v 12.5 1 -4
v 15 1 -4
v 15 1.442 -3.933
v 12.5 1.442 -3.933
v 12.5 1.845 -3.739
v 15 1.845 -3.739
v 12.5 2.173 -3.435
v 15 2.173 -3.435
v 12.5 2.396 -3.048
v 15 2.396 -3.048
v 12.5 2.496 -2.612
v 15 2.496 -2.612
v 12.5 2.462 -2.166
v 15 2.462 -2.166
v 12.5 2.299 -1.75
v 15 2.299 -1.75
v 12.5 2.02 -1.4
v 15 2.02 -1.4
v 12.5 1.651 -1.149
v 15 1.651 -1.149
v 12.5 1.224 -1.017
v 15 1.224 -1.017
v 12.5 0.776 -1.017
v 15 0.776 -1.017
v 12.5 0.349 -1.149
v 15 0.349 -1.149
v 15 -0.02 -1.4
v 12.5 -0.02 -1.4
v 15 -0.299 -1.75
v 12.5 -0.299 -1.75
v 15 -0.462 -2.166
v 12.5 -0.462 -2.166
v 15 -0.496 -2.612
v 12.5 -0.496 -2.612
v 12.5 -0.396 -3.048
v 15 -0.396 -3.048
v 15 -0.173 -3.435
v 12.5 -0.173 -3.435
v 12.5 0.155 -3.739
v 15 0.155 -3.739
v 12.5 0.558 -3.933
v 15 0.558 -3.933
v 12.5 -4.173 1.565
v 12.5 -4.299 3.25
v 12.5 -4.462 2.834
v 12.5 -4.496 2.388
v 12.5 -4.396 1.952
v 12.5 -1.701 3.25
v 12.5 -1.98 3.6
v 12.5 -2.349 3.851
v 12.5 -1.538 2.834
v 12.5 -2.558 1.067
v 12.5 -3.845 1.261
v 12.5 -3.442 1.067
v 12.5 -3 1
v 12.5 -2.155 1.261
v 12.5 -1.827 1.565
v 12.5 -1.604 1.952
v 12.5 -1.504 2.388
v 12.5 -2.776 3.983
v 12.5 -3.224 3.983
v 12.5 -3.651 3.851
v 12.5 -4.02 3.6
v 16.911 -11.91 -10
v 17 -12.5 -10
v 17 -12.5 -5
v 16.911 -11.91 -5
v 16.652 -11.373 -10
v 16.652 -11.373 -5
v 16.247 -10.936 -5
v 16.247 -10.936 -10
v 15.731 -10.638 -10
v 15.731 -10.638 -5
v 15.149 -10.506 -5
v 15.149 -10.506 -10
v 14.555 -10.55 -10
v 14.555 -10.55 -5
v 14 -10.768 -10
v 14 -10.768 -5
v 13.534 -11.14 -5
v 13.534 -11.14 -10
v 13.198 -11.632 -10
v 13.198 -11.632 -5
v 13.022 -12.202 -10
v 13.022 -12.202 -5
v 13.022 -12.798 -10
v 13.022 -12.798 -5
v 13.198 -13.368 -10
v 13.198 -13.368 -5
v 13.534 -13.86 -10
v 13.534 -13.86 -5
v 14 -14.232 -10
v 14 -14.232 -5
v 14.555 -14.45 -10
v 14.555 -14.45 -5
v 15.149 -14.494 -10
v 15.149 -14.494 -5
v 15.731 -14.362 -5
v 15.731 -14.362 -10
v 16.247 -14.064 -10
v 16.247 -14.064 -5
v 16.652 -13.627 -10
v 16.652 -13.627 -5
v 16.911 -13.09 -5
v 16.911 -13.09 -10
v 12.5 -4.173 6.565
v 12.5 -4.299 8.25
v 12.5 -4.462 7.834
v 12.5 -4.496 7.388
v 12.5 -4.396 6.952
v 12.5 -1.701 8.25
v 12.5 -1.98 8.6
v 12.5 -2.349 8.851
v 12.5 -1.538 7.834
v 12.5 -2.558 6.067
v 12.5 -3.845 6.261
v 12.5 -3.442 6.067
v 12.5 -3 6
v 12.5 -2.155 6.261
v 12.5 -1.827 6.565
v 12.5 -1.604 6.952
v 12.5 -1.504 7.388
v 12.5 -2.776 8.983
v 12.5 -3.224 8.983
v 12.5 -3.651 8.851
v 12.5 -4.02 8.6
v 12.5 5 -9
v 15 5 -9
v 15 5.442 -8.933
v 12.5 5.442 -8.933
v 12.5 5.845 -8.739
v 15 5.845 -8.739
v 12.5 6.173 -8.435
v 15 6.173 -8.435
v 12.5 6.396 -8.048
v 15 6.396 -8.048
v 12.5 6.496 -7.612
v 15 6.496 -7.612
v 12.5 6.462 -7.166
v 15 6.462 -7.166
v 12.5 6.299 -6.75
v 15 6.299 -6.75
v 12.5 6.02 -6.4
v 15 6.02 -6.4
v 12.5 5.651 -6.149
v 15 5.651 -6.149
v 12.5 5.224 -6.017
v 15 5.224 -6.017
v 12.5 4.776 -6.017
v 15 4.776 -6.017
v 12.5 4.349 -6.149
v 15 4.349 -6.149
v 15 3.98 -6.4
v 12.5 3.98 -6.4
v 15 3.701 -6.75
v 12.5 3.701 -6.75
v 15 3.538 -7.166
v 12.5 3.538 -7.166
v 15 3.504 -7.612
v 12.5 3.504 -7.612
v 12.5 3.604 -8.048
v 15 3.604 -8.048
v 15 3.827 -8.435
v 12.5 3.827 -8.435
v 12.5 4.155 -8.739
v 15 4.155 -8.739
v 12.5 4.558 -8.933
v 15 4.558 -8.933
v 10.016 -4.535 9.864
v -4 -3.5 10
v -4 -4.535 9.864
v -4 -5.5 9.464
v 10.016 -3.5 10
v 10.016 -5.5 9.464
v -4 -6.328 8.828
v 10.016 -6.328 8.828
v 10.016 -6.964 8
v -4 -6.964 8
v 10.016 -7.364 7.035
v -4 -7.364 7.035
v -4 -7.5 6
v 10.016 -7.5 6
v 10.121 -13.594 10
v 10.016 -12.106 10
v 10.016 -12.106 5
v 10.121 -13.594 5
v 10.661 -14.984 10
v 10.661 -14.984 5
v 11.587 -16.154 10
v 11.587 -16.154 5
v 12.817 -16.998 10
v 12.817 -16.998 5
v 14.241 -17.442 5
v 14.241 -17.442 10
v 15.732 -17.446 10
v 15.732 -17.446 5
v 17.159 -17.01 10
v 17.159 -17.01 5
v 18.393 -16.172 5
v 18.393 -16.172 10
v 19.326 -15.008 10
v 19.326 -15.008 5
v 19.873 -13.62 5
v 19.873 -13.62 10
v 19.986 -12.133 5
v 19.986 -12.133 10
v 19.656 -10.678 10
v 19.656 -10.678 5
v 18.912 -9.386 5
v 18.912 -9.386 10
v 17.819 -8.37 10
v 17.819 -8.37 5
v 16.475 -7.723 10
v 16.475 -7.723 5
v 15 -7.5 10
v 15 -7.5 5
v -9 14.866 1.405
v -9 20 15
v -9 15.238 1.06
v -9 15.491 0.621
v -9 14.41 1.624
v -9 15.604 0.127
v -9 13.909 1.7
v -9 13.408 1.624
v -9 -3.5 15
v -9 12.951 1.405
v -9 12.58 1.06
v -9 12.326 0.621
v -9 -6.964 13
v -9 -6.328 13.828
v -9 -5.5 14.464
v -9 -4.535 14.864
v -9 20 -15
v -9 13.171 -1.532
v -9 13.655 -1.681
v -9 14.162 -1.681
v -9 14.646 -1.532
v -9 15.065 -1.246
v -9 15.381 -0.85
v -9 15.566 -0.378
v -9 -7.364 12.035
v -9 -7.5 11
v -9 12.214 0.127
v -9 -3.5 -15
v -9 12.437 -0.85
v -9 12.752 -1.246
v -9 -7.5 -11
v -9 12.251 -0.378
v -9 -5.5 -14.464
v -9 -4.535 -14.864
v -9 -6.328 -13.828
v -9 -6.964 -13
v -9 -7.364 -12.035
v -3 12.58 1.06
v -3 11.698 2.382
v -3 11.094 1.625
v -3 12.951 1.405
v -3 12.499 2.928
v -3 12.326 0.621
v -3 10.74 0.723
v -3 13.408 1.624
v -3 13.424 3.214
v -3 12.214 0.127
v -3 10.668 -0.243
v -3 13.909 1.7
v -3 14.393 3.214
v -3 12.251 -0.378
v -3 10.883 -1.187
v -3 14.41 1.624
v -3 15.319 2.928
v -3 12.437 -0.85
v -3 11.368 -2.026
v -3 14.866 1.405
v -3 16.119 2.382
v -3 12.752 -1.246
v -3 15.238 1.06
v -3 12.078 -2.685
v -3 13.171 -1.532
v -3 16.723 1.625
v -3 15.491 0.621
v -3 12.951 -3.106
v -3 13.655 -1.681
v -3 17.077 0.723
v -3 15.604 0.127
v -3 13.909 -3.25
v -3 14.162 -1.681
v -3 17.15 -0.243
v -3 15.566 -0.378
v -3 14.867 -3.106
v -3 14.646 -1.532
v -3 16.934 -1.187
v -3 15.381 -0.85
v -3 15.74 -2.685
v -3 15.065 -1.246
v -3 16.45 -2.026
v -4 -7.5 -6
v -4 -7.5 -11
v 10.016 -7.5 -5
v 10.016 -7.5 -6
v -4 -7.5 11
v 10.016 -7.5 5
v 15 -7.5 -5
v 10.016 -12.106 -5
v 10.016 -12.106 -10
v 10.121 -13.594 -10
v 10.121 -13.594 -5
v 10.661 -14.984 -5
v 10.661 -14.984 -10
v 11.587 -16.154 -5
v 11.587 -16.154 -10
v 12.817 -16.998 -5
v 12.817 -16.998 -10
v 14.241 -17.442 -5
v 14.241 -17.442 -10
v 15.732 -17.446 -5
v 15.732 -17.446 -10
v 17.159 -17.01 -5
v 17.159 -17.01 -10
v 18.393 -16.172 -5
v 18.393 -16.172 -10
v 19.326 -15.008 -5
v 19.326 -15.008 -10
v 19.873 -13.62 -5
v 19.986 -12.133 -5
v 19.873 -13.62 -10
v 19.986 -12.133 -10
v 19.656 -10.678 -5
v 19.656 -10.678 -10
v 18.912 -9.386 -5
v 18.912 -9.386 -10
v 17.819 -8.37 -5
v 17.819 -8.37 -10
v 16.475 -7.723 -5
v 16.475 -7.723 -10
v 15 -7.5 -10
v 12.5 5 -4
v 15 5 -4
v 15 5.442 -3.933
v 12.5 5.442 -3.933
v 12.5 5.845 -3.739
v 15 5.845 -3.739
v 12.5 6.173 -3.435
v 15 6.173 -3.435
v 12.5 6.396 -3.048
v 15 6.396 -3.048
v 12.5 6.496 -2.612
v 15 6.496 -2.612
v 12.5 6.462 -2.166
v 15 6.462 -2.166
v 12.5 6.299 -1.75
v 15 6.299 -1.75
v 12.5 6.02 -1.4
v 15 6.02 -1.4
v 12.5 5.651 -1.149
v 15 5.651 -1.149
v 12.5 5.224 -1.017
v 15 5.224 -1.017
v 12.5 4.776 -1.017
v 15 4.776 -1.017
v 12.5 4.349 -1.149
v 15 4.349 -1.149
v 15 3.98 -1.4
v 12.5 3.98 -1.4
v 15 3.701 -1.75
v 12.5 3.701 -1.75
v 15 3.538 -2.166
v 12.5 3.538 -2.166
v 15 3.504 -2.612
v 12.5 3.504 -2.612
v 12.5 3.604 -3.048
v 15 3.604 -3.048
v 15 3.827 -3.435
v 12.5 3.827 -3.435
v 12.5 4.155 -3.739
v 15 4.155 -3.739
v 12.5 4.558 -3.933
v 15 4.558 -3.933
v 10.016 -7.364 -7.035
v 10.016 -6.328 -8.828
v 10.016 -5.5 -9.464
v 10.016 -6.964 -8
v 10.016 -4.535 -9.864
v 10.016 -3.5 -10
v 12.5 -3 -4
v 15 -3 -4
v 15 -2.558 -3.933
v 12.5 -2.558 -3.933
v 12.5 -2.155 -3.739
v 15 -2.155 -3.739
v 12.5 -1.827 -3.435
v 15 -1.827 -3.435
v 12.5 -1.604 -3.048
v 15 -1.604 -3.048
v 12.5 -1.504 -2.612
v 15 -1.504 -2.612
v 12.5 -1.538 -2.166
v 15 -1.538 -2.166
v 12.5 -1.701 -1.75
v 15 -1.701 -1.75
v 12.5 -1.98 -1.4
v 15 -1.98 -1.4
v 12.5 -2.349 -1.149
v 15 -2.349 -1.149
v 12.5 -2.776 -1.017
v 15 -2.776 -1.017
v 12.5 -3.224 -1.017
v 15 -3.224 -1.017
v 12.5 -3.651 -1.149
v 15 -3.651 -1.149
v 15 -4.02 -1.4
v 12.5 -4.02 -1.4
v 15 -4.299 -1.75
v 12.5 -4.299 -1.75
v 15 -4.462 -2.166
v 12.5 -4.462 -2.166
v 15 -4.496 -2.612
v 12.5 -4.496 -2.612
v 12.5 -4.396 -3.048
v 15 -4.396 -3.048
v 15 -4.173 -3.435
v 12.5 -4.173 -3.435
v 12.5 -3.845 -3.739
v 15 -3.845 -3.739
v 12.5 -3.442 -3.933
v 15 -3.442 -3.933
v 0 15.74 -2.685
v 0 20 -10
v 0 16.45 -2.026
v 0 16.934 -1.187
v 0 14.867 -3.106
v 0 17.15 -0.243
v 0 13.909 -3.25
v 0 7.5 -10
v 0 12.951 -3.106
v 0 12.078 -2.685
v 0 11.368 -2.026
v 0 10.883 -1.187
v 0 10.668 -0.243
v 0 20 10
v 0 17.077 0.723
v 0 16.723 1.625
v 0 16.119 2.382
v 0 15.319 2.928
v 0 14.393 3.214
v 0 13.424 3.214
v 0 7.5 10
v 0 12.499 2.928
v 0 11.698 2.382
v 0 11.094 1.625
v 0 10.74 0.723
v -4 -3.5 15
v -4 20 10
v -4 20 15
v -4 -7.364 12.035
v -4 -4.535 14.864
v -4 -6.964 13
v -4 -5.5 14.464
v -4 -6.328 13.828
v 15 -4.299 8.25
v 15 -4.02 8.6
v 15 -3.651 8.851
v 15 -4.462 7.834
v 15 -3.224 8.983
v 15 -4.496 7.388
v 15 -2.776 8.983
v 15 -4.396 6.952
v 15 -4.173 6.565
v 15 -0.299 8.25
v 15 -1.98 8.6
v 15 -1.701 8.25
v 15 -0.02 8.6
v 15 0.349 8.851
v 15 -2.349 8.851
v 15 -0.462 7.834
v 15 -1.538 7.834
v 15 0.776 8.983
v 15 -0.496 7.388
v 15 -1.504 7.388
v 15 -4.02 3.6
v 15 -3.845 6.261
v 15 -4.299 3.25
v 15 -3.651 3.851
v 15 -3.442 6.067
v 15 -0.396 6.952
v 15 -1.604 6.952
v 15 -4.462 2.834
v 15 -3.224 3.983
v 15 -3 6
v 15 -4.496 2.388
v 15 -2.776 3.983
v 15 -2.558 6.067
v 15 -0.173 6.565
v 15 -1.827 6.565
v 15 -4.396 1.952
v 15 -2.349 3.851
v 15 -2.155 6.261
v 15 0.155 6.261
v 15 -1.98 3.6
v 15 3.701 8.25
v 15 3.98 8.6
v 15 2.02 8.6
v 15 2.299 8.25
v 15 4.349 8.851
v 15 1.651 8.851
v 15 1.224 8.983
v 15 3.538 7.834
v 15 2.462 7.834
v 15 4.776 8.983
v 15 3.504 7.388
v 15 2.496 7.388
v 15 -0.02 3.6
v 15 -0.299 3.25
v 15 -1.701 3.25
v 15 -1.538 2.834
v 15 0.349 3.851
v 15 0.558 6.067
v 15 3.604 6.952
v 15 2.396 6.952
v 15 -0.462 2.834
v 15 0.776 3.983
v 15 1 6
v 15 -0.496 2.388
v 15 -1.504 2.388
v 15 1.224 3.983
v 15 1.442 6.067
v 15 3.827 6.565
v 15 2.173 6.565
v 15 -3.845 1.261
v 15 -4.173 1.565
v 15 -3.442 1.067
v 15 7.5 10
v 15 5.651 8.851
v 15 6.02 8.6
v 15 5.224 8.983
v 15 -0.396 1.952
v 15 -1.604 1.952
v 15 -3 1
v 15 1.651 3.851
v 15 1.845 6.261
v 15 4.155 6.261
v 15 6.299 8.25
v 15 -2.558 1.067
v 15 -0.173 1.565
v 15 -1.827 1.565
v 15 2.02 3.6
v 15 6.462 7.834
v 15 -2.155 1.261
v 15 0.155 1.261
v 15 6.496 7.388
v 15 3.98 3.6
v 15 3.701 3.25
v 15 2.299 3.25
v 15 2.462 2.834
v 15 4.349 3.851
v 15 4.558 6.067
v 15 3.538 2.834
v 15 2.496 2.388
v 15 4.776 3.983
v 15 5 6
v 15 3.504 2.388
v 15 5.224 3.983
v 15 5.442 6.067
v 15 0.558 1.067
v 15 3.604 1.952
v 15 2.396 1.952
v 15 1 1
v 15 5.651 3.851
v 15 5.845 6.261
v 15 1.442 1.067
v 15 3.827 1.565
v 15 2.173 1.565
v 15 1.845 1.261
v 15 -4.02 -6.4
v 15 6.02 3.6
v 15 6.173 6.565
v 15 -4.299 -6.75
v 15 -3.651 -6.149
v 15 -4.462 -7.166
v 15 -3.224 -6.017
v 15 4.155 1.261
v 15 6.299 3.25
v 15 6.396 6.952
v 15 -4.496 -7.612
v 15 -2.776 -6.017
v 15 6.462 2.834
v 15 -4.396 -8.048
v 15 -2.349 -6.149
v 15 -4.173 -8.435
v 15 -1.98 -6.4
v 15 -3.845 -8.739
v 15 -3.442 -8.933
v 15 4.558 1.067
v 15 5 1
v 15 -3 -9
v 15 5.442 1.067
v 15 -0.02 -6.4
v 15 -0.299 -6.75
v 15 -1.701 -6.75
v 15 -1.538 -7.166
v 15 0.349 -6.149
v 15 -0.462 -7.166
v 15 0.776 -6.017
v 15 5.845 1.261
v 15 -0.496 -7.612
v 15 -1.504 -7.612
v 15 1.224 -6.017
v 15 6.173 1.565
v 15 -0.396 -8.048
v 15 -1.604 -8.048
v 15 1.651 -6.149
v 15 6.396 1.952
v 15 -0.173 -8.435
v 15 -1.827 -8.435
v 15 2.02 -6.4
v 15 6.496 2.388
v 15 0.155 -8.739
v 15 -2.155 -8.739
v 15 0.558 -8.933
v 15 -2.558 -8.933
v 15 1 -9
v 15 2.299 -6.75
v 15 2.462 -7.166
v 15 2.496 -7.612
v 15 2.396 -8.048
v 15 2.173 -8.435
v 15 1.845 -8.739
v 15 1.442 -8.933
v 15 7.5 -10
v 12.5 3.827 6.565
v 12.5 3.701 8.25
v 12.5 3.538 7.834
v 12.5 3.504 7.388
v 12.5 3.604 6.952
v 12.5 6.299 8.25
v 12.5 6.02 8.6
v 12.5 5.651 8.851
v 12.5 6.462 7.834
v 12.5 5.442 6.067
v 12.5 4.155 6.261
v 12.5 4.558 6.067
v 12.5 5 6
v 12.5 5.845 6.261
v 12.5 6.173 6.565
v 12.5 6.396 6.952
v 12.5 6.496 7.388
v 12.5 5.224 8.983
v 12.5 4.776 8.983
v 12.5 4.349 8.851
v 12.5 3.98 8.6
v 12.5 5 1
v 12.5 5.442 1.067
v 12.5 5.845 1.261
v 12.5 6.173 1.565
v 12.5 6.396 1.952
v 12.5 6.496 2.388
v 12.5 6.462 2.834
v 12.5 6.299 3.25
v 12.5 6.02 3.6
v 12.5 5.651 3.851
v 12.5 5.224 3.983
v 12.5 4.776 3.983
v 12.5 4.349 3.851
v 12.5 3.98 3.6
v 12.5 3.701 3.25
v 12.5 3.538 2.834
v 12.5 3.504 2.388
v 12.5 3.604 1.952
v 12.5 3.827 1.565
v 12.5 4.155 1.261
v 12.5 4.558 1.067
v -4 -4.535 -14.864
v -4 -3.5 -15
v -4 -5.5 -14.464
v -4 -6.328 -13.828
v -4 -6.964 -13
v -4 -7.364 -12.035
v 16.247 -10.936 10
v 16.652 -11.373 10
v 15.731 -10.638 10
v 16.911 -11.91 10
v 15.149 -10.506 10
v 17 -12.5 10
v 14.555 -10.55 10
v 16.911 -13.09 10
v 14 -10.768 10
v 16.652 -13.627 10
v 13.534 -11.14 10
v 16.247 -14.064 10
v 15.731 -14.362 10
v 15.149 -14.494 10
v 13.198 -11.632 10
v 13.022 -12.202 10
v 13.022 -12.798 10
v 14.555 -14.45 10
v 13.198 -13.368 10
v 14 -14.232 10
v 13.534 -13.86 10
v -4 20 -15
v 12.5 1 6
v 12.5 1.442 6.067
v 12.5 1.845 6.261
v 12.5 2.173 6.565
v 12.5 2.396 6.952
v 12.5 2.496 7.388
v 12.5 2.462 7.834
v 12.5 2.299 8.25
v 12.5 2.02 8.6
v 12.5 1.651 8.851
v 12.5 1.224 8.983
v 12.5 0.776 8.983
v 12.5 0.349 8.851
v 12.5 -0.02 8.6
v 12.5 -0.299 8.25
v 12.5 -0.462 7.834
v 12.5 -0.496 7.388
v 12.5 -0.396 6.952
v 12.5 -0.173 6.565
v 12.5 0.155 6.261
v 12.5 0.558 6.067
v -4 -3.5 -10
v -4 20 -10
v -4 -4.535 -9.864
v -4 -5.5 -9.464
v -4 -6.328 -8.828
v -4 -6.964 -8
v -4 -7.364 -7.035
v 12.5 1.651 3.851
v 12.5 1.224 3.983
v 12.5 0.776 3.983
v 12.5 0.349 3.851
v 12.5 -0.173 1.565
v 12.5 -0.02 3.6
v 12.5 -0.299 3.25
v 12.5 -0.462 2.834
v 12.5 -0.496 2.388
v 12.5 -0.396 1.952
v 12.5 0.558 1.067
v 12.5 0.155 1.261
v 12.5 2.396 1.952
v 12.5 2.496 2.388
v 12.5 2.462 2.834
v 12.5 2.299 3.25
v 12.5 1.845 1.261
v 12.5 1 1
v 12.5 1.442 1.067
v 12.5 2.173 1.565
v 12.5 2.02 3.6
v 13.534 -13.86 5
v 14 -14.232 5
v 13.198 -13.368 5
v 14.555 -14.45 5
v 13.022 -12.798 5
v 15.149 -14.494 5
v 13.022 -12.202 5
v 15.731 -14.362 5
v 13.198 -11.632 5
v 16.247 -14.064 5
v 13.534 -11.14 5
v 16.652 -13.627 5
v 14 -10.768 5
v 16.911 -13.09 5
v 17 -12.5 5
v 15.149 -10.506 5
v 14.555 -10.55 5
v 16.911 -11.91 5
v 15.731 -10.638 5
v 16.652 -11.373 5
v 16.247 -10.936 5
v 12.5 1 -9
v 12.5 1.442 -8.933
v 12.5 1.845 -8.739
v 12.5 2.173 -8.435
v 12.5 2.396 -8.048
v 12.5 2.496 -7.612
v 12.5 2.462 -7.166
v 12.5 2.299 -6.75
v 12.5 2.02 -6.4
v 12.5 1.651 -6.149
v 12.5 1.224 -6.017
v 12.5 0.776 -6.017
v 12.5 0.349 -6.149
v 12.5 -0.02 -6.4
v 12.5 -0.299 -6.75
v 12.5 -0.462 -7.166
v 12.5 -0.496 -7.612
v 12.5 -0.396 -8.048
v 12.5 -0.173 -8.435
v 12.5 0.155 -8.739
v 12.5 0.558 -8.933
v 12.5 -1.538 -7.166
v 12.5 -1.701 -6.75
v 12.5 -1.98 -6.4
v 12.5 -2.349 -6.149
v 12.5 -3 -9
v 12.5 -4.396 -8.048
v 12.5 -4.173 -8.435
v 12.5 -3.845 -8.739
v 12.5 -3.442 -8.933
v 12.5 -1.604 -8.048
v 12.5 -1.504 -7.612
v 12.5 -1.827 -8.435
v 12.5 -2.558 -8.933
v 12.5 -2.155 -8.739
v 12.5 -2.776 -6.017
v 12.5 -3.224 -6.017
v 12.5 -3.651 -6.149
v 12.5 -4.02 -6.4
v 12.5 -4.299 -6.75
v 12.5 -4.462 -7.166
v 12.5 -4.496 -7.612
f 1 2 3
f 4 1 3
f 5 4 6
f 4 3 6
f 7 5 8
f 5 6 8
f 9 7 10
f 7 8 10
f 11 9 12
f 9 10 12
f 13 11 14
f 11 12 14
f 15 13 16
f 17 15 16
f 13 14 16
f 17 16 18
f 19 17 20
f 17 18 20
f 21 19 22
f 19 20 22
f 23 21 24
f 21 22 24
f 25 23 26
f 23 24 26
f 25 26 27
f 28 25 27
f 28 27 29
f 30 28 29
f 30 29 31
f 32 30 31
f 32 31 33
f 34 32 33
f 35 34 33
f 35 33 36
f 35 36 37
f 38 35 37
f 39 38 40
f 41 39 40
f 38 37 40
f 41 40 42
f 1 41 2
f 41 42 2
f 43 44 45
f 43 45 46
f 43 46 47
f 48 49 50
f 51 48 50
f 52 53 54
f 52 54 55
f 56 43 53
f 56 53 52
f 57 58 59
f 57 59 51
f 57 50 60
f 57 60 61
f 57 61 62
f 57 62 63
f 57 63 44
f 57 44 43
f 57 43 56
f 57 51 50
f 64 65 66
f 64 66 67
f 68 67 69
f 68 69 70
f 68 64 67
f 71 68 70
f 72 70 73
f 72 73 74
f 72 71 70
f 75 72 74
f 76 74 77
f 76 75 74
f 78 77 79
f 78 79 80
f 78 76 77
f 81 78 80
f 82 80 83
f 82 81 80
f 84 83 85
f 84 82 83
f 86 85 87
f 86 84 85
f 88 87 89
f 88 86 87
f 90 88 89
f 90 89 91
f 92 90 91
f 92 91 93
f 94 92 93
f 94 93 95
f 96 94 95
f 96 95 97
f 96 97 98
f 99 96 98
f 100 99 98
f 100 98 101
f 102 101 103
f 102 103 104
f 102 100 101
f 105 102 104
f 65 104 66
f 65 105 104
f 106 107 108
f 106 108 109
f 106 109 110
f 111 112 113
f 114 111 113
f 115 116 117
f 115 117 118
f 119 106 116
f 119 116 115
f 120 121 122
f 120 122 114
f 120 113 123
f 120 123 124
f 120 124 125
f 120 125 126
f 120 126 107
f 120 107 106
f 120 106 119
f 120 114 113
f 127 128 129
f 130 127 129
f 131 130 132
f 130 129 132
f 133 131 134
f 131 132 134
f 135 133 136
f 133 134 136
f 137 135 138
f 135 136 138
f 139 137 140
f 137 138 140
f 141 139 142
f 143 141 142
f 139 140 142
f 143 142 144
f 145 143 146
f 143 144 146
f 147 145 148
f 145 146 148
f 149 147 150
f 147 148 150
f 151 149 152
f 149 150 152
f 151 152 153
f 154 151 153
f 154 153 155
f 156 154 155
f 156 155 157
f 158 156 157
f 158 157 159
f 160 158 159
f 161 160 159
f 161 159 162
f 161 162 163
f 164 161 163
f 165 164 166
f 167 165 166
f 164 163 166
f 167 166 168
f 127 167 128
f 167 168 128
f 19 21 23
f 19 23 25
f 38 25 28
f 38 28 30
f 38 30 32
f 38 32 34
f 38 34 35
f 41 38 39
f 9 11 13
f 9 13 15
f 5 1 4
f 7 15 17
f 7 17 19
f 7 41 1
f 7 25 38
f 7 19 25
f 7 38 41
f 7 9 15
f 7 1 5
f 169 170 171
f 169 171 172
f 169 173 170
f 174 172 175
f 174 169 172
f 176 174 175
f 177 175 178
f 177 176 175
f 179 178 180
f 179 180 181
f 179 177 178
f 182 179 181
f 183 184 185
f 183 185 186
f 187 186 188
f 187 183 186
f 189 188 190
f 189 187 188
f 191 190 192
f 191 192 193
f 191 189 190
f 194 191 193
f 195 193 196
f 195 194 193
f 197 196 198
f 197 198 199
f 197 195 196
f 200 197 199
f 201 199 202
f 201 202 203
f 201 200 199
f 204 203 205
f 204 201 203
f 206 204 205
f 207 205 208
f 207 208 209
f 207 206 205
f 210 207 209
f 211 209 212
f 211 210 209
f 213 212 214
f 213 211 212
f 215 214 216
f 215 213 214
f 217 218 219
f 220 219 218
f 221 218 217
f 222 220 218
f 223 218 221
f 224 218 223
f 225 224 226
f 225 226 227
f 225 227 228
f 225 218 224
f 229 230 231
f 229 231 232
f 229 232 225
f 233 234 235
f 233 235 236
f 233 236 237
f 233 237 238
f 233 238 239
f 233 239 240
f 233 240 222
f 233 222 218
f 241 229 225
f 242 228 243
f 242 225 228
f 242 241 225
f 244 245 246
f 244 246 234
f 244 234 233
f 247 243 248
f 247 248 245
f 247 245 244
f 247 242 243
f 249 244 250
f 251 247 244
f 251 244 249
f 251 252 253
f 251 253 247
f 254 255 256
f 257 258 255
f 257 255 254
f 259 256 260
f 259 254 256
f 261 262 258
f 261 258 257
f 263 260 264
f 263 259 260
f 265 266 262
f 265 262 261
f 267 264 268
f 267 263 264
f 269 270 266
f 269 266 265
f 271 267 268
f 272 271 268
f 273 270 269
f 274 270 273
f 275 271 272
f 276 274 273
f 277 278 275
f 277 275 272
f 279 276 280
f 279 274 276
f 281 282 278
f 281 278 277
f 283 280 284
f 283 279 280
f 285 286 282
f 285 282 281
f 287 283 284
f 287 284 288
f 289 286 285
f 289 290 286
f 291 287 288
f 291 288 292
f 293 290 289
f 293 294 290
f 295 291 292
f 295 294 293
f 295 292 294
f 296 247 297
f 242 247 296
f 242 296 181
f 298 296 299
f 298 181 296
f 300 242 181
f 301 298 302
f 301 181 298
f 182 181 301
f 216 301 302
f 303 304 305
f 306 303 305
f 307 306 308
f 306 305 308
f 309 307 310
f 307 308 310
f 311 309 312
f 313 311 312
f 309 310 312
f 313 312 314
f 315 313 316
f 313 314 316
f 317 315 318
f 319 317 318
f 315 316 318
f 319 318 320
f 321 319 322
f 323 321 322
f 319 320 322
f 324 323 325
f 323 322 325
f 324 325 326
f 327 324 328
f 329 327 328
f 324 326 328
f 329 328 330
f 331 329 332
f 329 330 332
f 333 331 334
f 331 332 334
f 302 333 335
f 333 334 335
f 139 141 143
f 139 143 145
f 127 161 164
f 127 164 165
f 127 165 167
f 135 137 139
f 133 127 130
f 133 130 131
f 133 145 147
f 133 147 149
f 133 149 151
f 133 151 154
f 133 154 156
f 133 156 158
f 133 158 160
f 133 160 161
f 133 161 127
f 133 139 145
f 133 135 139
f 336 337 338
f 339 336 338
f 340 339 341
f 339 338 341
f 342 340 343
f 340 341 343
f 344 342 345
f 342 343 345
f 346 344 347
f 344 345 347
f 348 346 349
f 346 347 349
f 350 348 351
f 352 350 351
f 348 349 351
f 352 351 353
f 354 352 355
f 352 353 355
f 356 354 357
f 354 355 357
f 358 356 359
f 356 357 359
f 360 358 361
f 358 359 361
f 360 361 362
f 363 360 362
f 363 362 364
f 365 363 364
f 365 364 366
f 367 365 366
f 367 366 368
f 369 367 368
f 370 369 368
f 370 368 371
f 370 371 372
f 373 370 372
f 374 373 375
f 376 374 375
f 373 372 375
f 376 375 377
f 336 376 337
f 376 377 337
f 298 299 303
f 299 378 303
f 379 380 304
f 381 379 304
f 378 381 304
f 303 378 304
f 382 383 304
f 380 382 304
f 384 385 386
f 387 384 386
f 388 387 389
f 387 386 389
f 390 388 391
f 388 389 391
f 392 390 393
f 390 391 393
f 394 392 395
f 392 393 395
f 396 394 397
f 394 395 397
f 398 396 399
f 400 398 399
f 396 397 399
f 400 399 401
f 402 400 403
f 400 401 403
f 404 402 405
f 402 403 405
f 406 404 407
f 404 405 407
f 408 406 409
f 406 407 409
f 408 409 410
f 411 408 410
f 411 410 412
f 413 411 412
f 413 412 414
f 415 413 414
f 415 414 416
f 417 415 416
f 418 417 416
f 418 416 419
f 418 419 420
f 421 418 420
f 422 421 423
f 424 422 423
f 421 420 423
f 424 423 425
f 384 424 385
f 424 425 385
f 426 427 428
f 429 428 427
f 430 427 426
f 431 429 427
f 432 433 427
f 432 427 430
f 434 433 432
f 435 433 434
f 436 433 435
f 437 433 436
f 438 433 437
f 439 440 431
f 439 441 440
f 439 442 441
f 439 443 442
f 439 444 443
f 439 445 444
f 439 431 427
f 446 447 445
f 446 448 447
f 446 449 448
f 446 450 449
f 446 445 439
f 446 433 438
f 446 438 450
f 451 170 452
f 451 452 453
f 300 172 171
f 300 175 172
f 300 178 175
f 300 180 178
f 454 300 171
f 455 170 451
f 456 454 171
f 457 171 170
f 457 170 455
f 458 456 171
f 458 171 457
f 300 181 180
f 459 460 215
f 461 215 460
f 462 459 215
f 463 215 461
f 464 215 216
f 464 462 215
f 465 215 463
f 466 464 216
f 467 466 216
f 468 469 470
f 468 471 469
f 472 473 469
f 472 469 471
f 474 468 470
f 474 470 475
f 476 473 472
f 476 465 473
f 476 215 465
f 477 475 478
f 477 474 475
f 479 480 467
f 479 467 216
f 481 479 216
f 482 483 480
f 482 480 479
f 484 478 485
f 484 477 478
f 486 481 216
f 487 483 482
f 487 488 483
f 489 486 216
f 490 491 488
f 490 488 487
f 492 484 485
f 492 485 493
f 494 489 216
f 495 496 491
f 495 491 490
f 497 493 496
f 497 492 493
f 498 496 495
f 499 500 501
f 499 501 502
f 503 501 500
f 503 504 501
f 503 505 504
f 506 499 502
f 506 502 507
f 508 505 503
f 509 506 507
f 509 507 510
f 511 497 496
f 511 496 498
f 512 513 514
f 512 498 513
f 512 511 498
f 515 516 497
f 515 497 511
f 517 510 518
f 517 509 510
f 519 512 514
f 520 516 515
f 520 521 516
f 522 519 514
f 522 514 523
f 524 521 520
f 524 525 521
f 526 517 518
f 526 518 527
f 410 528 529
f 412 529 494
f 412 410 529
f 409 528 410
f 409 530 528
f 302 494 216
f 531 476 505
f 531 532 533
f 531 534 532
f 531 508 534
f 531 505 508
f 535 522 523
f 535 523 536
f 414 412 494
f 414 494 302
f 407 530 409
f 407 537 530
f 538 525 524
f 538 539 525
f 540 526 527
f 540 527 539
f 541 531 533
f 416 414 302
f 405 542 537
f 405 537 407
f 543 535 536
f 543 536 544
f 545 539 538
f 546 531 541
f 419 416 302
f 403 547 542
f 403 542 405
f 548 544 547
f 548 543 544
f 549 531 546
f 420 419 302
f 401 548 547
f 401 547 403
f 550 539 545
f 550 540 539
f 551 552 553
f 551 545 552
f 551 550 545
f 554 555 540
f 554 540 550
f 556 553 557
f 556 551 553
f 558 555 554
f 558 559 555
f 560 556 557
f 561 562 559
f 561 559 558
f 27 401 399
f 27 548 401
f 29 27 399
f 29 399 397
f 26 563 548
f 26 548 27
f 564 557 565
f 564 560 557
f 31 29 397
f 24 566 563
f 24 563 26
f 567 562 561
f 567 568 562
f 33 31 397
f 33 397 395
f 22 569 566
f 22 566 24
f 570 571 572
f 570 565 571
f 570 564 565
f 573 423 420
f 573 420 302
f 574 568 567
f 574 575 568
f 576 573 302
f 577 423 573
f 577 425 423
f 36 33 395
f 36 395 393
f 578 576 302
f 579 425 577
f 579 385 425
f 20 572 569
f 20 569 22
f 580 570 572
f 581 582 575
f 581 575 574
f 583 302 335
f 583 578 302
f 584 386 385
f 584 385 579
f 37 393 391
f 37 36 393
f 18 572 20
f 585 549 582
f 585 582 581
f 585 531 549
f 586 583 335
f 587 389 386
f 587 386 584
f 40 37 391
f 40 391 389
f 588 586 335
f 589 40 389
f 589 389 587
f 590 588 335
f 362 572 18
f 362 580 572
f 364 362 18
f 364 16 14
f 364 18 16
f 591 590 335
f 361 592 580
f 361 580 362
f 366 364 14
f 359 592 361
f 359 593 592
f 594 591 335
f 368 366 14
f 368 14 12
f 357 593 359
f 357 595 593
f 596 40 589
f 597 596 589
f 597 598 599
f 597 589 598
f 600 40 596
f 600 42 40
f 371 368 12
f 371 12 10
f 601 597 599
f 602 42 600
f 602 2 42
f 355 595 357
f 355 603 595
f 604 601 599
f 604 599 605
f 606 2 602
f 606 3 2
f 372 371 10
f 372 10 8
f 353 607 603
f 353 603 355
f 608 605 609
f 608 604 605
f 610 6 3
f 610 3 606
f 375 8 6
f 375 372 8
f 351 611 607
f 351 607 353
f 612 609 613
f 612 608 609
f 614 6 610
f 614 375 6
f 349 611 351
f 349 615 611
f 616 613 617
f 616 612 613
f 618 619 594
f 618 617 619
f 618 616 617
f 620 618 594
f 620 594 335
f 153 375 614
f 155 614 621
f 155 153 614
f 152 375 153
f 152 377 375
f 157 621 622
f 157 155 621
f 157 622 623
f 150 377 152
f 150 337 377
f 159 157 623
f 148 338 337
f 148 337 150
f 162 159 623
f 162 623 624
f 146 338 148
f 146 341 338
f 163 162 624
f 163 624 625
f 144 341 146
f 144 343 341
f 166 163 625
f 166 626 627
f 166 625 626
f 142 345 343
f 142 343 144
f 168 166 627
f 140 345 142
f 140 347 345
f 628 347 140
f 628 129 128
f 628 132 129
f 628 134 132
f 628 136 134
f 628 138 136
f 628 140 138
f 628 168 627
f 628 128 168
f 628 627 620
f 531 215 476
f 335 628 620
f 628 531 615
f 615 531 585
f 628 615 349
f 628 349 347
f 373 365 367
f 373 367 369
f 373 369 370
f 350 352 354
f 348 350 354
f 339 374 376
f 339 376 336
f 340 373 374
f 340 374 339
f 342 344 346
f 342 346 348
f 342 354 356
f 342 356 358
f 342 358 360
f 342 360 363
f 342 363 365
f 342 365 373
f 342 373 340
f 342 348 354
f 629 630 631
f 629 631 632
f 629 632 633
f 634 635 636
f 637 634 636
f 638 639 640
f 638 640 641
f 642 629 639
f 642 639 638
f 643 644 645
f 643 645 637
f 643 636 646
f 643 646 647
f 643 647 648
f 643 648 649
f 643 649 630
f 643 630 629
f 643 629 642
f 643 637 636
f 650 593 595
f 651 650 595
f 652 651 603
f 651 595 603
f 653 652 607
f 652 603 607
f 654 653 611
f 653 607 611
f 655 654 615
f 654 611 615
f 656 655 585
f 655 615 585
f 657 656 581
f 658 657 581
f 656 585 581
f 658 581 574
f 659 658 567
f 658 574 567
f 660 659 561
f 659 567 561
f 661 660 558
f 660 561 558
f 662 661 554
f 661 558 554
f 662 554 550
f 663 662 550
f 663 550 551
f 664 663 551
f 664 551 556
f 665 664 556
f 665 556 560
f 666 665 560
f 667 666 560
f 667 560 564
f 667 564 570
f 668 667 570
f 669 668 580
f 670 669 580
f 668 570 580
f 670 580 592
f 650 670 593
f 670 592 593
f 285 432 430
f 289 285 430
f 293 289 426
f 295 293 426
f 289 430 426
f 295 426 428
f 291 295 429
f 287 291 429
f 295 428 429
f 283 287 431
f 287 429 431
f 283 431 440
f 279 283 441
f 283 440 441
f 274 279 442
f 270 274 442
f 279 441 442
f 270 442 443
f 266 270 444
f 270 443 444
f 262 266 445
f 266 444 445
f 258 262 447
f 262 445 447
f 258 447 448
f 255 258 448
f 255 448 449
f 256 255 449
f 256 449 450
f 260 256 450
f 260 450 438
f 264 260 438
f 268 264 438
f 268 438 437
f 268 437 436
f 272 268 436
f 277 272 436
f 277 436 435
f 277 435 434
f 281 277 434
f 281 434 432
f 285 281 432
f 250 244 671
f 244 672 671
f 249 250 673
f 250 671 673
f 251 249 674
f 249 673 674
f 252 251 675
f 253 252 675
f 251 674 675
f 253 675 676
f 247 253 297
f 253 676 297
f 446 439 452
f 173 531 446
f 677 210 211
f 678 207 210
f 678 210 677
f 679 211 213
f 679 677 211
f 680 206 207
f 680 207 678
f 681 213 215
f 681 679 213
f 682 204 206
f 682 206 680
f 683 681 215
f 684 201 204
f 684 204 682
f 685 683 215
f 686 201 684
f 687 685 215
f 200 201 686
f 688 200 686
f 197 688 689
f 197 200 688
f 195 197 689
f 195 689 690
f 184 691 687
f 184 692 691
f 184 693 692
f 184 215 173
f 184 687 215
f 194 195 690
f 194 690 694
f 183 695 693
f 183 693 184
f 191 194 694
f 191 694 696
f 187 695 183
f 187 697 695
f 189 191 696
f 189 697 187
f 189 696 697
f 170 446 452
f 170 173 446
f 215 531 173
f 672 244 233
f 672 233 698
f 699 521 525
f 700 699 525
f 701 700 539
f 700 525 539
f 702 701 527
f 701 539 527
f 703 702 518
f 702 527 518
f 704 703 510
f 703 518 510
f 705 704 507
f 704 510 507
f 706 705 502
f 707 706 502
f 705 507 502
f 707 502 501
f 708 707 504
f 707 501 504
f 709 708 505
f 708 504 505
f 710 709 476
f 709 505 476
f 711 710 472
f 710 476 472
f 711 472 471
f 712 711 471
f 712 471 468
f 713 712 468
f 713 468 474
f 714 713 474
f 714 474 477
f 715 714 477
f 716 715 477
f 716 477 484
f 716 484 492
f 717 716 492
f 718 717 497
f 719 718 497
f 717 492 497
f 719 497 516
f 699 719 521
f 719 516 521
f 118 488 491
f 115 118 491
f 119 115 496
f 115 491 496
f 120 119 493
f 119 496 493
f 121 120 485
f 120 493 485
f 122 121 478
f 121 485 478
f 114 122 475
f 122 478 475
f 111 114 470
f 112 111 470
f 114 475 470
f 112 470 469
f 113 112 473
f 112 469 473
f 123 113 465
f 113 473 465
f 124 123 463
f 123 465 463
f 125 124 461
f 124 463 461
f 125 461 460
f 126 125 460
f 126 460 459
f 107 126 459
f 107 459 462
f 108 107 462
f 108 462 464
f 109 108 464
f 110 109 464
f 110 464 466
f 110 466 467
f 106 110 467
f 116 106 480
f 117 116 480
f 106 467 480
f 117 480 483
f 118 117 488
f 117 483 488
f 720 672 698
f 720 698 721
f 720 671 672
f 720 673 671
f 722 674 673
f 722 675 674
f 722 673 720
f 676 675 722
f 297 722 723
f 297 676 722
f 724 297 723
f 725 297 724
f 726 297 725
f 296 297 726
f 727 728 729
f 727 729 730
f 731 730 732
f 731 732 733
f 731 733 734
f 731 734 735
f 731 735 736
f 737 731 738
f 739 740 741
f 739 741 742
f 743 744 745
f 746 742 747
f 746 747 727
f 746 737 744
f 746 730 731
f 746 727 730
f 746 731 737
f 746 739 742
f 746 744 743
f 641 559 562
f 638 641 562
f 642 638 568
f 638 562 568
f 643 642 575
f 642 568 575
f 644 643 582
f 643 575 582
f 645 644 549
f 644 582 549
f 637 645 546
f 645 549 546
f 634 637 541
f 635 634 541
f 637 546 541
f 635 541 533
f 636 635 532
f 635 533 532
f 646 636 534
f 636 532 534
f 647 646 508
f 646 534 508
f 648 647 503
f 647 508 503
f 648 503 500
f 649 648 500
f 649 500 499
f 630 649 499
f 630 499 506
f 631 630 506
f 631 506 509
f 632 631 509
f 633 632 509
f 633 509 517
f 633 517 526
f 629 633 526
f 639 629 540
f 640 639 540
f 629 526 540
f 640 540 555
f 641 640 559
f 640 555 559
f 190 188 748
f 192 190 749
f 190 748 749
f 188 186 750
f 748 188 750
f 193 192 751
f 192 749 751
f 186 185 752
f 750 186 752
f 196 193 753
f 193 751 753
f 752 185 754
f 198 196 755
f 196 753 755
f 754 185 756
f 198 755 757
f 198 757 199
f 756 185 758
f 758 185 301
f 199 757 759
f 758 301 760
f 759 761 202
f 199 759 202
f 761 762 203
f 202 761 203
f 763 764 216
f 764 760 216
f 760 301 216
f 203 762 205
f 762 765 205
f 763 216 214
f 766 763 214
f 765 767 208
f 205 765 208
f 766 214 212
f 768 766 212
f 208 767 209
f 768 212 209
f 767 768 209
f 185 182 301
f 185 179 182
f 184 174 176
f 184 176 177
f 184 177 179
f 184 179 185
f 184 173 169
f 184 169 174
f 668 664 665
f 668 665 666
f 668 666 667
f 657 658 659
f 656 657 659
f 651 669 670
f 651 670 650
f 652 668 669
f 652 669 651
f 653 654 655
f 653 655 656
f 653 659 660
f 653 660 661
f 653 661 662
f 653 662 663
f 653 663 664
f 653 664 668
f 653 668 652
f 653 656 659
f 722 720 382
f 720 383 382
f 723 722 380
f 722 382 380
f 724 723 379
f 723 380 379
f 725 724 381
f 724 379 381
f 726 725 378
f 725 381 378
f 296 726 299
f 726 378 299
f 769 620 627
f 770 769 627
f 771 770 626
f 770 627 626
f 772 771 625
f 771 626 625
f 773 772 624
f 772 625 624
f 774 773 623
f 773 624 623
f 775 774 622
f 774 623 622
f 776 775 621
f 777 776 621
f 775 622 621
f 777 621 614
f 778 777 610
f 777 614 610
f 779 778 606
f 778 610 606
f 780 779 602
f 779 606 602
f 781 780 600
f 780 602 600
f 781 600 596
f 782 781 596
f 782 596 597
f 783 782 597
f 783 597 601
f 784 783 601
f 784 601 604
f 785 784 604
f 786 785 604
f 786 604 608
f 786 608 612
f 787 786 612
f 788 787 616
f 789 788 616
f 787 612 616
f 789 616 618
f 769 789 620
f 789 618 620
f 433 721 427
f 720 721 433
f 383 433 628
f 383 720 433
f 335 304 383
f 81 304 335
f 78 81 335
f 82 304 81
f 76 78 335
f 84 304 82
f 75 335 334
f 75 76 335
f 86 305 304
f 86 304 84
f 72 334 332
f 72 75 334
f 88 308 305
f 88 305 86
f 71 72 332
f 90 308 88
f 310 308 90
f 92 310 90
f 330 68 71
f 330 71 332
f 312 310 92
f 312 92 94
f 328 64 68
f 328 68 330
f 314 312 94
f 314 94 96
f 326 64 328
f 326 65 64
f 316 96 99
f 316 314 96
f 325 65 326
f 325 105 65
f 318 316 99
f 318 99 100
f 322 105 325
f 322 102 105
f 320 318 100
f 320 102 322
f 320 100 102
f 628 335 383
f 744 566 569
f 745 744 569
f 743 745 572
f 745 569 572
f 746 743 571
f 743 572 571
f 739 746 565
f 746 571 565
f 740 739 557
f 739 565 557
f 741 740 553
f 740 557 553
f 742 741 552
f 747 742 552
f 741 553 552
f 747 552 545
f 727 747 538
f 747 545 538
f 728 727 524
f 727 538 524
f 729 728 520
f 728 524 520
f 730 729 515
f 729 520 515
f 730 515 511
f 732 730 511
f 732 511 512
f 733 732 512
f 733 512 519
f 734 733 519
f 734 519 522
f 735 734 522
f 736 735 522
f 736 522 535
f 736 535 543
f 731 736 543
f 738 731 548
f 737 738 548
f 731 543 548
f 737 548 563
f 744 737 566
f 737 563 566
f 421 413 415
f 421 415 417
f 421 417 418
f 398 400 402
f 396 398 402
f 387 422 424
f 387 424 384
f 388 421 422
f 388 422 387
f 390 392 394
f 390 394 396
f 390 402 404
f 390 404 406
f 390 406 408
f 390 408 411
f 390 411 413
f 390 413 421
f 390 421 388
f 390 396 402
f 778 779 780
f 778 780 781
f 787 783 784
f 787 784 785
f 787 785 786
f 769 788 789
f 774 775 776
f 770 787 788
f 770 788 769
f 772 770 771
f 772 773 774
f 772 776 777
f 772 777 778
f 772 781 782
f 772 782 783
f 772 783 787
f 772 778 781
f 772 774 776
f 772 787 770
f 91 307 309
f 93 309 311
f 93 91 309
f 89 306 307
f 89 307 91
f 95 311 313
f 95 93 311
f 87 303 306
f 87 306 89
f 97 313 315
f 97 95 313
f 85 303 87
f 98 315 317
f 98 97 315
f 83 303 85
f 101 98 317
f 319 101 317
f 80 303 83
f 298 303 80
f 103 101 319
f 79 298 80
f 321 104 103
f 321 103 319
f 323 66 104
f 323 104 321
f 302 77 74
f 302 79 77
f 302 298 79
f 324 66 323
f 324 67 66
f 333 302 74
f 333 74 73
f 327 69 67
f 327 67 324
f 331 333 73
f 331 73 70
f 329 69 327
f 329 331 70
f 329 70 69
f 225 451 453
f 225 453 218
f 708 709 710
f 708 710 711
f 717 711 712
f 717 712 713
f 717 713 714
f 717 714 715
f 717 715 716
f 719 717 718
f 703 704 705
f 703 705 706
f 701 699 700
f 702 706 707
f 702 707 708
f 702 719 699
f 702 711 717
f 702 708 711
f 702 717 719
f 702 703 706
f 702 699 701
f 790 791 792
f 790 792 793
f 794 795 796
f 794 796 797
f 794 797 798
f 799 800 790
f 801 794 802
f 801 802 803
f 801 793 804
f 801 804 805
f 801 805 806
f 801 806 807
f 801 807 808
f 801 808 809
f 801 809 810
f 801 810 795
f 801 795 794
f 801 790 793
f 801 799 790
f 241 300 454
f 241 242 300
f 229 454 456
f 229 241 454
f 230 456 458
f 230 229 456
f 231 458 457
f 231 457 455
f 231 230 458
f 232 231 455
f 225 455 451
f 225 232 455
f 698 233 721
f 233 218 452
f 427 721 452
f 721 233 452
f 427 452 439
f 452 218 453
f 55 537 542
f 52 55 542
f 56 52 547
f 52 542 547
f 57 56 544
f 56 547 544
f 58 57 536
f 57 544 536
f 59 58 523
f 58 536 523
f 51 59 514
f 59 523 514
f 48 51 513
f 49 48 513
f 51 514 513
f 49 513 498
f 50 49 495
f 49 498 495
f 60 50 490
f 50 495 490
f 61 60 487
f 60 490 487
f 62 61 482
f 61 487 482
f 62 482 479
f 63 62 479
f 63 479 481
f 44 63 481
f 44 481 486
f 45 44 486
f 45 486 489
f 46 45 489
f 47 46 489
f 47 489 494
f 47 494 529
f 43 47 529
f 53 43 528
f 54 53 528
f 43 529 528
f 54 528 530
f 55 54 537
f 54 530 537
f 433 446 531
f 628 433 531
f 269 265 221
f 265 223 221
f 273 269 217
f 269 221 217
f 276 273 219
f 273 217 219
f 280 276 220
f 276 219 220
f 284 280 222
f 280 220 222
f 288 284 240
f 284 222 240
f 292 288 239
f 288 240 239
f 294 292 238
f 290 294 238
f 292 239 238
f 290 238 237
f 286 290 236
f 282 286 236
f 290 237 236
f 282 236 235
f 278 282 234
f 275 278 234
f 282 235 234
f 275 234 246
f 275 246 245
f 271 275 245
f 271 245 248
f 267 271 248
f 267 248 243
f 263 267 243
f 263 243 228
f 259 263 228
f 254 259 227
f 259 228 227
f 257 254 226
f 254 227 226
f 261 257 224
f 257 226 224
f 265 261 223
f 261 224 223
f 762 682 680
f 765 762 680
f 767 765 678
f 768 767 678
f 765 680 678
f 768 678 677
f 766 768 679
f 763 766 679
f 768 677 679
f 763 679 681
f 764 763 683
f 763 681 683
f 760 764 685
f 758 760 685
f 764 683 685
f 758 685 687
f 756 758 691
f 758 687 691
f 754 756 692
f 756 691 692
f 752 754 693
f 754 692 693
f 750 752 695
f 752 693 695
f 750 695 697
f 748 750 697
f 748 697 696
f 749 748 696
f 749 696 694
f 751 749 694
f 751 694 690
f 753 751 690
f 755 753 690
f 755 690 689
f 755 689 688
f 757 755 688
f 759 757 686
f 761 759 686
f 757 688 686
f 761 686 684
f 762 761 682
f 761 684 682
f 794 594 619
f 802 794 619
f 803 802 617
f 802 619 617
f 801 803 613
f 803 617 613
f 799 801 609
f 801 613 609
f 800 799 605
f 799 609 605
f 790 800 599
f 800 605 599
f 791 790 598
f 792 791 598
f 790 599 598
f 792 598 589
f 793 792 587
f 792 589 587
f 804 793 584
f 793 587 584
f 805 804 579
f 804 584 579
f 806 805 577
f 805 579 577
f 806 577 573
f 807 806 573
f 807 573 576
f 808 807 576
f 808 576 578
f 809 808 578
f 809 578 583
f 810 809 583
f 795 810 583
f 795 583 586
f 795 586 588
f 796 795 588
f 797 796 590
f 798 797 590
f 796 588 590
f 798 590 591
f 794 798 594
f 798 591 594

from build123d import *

# Parameters (mm, degrees)
SKETCH1_W                      = 20
SKETCH1_H                      = 15
BOSS_EXTRUDE1_DEPTH            = 15
SKETCH2_R                      = 2
BOSS_EXTRUDE2_DEPTH            = 5
BOSS_EXTRUDE3_DEPTH            = 15
BOSS_EXTRUDE3_DEPTH_BACK       = 12.5
FILLET1_R                      = 4
M3X0_5_TAPPED_HOLE1_D          = 2.5
M3X0_5_TAPPED_HOLE1_DEPTH      = 11
M3X0_5_TAPPED_HOLE1_TIP        = 0.751075774
CBORE_FOR_M3_SHCS1_D           = 3.4
CBORE_FOR_M3_SHCS1_DEPTH       = 9
CBORE_FOR_M3_SHCS1_CBORE_D     = 6.5
CBORE_FOR_M3_SHCS1_CBORE_DEPTH = 3
CBORE_FOR_M3_SHCS1_TIP         = 1.021463052
SKETCH8_R                      = 1.5
CUT_EXTRUDE1_DEPTH             = 2.5


with BuildPart() as part:
    # Sketch1 → Boss-Extrude1 (new body)
    with BuildSketch(Plane(origin=(0, 0, 0), x_dir=(0, 0, -1), z_dir=(1, 0, 0))):
        Rectangle(SKETCH1_W, SKETCH1_H)
    extrude(amount=BOSS_EXTRUDE1_DEPTH)

    # Sketch2 → Boss-Extrude2 (add)
    with BuildSketch(Plane.XY.offset(10)):
        with BuildLine():
            Line((15, -7.5), (10.015567122, -7.5))
            Line((10.015567122, -7.5), (10.015567122, -12.105755295))
            ThreePointArc((10.015567122, -12.105755295), (18.393285758, -16.172276101), (15, -7.5))
        make_face()
        with Locations((15, -12.5)):
            Circle(SKETCH2_R, mode=Mode.SUBTRACT)
    boss_extrude2 = extrude(amount=-BOSS_EXTRUDE2_DEPTH)

    # Mirror1: Boss-Extrude2 across plane
    add(boss_extrude2.mirror(Plane.XY))

    # Sketch3 → Boss-Extrude3 (add, two sides)
    with BuildSketch(Plane.XZ.offset(-7.5)) as boss_extrude3_sk:
        Polygon((-4, 10), (-4, 15), (-9, 15), (-9, -15), (-4, -15), (-4, -10), (0, -10), (0, 10), align=None)
    extrude(amount=BOSS_EXTRUDE3_DEPTH)
    extrude(boss_extrude3_sk.sketch, amount=-BOSS_EXTRUDE3_DEPTH_BACK)

    # Fillet1
    fillet1_edges = [part.edges().sort_by_distance(p)[0] for p in [
        (3.007783561, -7.5, 10),
        (3.007783561, -7.5, -10),
        (-6.5, -7.5, -15),
        (-6.5, -7.5, 15),
    ]]
    fillet(fillet1_edges, radius=FILLET1_R)

    # M3x0.5 Tapped Hole1
    with Locations(Plane(origin=(0, 0, 0), x_dir=(0, 0, -1), z_dir=(1, 0, 0))):
        with Locations((0, 13.90875121)):
            Hole(M3X0_5_TAPPED_HOLE1_D / 2, depth=M3X0_5_TAPPED_HOLE1_DEPTH)
            with Locations((0, 0, -(M3X0_5_TAPPED_HOLE1_DEPTH + M3X0_5_TAPPED_HOLE1_TIP / 2))):  # 118° drill point
                Cone(0, M3X0_5_TAPPED_HOLE1_D / 2, M3X0_5_TAPPED_HOLE1_TIP, mode=Mode.SUBTRACT)

    # CBORE for M3 SHCS1
    with Locations(Plane(origin=(0, 0, 0), x_dir=(0, 0, -1), z_dir=(1, 0, 0))):
        with Locations((0, 13.90875121)):
            CounterBoreHole(CBORE_FOR_M3_SHCS1_D / 2, CBORE_FOR_M3_SHCS1_CBORE_D / 2, CBORE_FOR_M3_SHCS1_CBORE_DEPTH, depth=CBORE_FOR_M3_SHCS1_DEPTH)
            with Locations((0, 0, -(CBORE_FOR_M3_SHCS1_DEPTH + CBORE_FOR_M3_SHCS1_TIP / 2))):  # 118° drill point
                Cone(0, CBORE_FOR_M3_SHCS1_D / 2, CBORE_FOR_M3_SHCS1_TIP, mode=Mode.SUBTRACT)

    # Sketch8 → Cut-Extrude1 (cut)
    with BuildSketch(Plane(origin=(15, 0, 0), x_dir=(0, 0, -1), z_dir=(1, 0, 0))):
        with Locations((-7.5, 5)):
            Circle(SKETCH8_R)
        with Locations((-2.5, 5)):
            Circle(SKETCH8_R)
        with Locations((2.5, 5)):
            Circle(SKETCH8_R)
        with Locations((7.5, 5)):
            Circle(SKETCH8_R)
        with Locations((-2.5, 1)):
            Circle(SKETCH8_R)
        with Locations((2.5, 1)):
            Circle(SKETCH8_R)
        with Locations((7.5, 1)):
            Circle(SKETCH8_R)
        with Locations((-2.5, -3)):
            Circle(SKETCH8_R)
        with Locations((2.5, -3)):
            Circle(SKETCH8_R)
        with Locations((7.5, -3)):
            Circle(SKETCH8_R)
        with Locations((-7.5, 1)):
            Circle(SKETCH8_R)
        with Locations((-7.5, -3)):
            Circle(SKETCH8_R)
    extrude(amount=-CUT_EXTRUDE1_DEPTH, mode=Mode.SUBTRACT)


solid = part.part
